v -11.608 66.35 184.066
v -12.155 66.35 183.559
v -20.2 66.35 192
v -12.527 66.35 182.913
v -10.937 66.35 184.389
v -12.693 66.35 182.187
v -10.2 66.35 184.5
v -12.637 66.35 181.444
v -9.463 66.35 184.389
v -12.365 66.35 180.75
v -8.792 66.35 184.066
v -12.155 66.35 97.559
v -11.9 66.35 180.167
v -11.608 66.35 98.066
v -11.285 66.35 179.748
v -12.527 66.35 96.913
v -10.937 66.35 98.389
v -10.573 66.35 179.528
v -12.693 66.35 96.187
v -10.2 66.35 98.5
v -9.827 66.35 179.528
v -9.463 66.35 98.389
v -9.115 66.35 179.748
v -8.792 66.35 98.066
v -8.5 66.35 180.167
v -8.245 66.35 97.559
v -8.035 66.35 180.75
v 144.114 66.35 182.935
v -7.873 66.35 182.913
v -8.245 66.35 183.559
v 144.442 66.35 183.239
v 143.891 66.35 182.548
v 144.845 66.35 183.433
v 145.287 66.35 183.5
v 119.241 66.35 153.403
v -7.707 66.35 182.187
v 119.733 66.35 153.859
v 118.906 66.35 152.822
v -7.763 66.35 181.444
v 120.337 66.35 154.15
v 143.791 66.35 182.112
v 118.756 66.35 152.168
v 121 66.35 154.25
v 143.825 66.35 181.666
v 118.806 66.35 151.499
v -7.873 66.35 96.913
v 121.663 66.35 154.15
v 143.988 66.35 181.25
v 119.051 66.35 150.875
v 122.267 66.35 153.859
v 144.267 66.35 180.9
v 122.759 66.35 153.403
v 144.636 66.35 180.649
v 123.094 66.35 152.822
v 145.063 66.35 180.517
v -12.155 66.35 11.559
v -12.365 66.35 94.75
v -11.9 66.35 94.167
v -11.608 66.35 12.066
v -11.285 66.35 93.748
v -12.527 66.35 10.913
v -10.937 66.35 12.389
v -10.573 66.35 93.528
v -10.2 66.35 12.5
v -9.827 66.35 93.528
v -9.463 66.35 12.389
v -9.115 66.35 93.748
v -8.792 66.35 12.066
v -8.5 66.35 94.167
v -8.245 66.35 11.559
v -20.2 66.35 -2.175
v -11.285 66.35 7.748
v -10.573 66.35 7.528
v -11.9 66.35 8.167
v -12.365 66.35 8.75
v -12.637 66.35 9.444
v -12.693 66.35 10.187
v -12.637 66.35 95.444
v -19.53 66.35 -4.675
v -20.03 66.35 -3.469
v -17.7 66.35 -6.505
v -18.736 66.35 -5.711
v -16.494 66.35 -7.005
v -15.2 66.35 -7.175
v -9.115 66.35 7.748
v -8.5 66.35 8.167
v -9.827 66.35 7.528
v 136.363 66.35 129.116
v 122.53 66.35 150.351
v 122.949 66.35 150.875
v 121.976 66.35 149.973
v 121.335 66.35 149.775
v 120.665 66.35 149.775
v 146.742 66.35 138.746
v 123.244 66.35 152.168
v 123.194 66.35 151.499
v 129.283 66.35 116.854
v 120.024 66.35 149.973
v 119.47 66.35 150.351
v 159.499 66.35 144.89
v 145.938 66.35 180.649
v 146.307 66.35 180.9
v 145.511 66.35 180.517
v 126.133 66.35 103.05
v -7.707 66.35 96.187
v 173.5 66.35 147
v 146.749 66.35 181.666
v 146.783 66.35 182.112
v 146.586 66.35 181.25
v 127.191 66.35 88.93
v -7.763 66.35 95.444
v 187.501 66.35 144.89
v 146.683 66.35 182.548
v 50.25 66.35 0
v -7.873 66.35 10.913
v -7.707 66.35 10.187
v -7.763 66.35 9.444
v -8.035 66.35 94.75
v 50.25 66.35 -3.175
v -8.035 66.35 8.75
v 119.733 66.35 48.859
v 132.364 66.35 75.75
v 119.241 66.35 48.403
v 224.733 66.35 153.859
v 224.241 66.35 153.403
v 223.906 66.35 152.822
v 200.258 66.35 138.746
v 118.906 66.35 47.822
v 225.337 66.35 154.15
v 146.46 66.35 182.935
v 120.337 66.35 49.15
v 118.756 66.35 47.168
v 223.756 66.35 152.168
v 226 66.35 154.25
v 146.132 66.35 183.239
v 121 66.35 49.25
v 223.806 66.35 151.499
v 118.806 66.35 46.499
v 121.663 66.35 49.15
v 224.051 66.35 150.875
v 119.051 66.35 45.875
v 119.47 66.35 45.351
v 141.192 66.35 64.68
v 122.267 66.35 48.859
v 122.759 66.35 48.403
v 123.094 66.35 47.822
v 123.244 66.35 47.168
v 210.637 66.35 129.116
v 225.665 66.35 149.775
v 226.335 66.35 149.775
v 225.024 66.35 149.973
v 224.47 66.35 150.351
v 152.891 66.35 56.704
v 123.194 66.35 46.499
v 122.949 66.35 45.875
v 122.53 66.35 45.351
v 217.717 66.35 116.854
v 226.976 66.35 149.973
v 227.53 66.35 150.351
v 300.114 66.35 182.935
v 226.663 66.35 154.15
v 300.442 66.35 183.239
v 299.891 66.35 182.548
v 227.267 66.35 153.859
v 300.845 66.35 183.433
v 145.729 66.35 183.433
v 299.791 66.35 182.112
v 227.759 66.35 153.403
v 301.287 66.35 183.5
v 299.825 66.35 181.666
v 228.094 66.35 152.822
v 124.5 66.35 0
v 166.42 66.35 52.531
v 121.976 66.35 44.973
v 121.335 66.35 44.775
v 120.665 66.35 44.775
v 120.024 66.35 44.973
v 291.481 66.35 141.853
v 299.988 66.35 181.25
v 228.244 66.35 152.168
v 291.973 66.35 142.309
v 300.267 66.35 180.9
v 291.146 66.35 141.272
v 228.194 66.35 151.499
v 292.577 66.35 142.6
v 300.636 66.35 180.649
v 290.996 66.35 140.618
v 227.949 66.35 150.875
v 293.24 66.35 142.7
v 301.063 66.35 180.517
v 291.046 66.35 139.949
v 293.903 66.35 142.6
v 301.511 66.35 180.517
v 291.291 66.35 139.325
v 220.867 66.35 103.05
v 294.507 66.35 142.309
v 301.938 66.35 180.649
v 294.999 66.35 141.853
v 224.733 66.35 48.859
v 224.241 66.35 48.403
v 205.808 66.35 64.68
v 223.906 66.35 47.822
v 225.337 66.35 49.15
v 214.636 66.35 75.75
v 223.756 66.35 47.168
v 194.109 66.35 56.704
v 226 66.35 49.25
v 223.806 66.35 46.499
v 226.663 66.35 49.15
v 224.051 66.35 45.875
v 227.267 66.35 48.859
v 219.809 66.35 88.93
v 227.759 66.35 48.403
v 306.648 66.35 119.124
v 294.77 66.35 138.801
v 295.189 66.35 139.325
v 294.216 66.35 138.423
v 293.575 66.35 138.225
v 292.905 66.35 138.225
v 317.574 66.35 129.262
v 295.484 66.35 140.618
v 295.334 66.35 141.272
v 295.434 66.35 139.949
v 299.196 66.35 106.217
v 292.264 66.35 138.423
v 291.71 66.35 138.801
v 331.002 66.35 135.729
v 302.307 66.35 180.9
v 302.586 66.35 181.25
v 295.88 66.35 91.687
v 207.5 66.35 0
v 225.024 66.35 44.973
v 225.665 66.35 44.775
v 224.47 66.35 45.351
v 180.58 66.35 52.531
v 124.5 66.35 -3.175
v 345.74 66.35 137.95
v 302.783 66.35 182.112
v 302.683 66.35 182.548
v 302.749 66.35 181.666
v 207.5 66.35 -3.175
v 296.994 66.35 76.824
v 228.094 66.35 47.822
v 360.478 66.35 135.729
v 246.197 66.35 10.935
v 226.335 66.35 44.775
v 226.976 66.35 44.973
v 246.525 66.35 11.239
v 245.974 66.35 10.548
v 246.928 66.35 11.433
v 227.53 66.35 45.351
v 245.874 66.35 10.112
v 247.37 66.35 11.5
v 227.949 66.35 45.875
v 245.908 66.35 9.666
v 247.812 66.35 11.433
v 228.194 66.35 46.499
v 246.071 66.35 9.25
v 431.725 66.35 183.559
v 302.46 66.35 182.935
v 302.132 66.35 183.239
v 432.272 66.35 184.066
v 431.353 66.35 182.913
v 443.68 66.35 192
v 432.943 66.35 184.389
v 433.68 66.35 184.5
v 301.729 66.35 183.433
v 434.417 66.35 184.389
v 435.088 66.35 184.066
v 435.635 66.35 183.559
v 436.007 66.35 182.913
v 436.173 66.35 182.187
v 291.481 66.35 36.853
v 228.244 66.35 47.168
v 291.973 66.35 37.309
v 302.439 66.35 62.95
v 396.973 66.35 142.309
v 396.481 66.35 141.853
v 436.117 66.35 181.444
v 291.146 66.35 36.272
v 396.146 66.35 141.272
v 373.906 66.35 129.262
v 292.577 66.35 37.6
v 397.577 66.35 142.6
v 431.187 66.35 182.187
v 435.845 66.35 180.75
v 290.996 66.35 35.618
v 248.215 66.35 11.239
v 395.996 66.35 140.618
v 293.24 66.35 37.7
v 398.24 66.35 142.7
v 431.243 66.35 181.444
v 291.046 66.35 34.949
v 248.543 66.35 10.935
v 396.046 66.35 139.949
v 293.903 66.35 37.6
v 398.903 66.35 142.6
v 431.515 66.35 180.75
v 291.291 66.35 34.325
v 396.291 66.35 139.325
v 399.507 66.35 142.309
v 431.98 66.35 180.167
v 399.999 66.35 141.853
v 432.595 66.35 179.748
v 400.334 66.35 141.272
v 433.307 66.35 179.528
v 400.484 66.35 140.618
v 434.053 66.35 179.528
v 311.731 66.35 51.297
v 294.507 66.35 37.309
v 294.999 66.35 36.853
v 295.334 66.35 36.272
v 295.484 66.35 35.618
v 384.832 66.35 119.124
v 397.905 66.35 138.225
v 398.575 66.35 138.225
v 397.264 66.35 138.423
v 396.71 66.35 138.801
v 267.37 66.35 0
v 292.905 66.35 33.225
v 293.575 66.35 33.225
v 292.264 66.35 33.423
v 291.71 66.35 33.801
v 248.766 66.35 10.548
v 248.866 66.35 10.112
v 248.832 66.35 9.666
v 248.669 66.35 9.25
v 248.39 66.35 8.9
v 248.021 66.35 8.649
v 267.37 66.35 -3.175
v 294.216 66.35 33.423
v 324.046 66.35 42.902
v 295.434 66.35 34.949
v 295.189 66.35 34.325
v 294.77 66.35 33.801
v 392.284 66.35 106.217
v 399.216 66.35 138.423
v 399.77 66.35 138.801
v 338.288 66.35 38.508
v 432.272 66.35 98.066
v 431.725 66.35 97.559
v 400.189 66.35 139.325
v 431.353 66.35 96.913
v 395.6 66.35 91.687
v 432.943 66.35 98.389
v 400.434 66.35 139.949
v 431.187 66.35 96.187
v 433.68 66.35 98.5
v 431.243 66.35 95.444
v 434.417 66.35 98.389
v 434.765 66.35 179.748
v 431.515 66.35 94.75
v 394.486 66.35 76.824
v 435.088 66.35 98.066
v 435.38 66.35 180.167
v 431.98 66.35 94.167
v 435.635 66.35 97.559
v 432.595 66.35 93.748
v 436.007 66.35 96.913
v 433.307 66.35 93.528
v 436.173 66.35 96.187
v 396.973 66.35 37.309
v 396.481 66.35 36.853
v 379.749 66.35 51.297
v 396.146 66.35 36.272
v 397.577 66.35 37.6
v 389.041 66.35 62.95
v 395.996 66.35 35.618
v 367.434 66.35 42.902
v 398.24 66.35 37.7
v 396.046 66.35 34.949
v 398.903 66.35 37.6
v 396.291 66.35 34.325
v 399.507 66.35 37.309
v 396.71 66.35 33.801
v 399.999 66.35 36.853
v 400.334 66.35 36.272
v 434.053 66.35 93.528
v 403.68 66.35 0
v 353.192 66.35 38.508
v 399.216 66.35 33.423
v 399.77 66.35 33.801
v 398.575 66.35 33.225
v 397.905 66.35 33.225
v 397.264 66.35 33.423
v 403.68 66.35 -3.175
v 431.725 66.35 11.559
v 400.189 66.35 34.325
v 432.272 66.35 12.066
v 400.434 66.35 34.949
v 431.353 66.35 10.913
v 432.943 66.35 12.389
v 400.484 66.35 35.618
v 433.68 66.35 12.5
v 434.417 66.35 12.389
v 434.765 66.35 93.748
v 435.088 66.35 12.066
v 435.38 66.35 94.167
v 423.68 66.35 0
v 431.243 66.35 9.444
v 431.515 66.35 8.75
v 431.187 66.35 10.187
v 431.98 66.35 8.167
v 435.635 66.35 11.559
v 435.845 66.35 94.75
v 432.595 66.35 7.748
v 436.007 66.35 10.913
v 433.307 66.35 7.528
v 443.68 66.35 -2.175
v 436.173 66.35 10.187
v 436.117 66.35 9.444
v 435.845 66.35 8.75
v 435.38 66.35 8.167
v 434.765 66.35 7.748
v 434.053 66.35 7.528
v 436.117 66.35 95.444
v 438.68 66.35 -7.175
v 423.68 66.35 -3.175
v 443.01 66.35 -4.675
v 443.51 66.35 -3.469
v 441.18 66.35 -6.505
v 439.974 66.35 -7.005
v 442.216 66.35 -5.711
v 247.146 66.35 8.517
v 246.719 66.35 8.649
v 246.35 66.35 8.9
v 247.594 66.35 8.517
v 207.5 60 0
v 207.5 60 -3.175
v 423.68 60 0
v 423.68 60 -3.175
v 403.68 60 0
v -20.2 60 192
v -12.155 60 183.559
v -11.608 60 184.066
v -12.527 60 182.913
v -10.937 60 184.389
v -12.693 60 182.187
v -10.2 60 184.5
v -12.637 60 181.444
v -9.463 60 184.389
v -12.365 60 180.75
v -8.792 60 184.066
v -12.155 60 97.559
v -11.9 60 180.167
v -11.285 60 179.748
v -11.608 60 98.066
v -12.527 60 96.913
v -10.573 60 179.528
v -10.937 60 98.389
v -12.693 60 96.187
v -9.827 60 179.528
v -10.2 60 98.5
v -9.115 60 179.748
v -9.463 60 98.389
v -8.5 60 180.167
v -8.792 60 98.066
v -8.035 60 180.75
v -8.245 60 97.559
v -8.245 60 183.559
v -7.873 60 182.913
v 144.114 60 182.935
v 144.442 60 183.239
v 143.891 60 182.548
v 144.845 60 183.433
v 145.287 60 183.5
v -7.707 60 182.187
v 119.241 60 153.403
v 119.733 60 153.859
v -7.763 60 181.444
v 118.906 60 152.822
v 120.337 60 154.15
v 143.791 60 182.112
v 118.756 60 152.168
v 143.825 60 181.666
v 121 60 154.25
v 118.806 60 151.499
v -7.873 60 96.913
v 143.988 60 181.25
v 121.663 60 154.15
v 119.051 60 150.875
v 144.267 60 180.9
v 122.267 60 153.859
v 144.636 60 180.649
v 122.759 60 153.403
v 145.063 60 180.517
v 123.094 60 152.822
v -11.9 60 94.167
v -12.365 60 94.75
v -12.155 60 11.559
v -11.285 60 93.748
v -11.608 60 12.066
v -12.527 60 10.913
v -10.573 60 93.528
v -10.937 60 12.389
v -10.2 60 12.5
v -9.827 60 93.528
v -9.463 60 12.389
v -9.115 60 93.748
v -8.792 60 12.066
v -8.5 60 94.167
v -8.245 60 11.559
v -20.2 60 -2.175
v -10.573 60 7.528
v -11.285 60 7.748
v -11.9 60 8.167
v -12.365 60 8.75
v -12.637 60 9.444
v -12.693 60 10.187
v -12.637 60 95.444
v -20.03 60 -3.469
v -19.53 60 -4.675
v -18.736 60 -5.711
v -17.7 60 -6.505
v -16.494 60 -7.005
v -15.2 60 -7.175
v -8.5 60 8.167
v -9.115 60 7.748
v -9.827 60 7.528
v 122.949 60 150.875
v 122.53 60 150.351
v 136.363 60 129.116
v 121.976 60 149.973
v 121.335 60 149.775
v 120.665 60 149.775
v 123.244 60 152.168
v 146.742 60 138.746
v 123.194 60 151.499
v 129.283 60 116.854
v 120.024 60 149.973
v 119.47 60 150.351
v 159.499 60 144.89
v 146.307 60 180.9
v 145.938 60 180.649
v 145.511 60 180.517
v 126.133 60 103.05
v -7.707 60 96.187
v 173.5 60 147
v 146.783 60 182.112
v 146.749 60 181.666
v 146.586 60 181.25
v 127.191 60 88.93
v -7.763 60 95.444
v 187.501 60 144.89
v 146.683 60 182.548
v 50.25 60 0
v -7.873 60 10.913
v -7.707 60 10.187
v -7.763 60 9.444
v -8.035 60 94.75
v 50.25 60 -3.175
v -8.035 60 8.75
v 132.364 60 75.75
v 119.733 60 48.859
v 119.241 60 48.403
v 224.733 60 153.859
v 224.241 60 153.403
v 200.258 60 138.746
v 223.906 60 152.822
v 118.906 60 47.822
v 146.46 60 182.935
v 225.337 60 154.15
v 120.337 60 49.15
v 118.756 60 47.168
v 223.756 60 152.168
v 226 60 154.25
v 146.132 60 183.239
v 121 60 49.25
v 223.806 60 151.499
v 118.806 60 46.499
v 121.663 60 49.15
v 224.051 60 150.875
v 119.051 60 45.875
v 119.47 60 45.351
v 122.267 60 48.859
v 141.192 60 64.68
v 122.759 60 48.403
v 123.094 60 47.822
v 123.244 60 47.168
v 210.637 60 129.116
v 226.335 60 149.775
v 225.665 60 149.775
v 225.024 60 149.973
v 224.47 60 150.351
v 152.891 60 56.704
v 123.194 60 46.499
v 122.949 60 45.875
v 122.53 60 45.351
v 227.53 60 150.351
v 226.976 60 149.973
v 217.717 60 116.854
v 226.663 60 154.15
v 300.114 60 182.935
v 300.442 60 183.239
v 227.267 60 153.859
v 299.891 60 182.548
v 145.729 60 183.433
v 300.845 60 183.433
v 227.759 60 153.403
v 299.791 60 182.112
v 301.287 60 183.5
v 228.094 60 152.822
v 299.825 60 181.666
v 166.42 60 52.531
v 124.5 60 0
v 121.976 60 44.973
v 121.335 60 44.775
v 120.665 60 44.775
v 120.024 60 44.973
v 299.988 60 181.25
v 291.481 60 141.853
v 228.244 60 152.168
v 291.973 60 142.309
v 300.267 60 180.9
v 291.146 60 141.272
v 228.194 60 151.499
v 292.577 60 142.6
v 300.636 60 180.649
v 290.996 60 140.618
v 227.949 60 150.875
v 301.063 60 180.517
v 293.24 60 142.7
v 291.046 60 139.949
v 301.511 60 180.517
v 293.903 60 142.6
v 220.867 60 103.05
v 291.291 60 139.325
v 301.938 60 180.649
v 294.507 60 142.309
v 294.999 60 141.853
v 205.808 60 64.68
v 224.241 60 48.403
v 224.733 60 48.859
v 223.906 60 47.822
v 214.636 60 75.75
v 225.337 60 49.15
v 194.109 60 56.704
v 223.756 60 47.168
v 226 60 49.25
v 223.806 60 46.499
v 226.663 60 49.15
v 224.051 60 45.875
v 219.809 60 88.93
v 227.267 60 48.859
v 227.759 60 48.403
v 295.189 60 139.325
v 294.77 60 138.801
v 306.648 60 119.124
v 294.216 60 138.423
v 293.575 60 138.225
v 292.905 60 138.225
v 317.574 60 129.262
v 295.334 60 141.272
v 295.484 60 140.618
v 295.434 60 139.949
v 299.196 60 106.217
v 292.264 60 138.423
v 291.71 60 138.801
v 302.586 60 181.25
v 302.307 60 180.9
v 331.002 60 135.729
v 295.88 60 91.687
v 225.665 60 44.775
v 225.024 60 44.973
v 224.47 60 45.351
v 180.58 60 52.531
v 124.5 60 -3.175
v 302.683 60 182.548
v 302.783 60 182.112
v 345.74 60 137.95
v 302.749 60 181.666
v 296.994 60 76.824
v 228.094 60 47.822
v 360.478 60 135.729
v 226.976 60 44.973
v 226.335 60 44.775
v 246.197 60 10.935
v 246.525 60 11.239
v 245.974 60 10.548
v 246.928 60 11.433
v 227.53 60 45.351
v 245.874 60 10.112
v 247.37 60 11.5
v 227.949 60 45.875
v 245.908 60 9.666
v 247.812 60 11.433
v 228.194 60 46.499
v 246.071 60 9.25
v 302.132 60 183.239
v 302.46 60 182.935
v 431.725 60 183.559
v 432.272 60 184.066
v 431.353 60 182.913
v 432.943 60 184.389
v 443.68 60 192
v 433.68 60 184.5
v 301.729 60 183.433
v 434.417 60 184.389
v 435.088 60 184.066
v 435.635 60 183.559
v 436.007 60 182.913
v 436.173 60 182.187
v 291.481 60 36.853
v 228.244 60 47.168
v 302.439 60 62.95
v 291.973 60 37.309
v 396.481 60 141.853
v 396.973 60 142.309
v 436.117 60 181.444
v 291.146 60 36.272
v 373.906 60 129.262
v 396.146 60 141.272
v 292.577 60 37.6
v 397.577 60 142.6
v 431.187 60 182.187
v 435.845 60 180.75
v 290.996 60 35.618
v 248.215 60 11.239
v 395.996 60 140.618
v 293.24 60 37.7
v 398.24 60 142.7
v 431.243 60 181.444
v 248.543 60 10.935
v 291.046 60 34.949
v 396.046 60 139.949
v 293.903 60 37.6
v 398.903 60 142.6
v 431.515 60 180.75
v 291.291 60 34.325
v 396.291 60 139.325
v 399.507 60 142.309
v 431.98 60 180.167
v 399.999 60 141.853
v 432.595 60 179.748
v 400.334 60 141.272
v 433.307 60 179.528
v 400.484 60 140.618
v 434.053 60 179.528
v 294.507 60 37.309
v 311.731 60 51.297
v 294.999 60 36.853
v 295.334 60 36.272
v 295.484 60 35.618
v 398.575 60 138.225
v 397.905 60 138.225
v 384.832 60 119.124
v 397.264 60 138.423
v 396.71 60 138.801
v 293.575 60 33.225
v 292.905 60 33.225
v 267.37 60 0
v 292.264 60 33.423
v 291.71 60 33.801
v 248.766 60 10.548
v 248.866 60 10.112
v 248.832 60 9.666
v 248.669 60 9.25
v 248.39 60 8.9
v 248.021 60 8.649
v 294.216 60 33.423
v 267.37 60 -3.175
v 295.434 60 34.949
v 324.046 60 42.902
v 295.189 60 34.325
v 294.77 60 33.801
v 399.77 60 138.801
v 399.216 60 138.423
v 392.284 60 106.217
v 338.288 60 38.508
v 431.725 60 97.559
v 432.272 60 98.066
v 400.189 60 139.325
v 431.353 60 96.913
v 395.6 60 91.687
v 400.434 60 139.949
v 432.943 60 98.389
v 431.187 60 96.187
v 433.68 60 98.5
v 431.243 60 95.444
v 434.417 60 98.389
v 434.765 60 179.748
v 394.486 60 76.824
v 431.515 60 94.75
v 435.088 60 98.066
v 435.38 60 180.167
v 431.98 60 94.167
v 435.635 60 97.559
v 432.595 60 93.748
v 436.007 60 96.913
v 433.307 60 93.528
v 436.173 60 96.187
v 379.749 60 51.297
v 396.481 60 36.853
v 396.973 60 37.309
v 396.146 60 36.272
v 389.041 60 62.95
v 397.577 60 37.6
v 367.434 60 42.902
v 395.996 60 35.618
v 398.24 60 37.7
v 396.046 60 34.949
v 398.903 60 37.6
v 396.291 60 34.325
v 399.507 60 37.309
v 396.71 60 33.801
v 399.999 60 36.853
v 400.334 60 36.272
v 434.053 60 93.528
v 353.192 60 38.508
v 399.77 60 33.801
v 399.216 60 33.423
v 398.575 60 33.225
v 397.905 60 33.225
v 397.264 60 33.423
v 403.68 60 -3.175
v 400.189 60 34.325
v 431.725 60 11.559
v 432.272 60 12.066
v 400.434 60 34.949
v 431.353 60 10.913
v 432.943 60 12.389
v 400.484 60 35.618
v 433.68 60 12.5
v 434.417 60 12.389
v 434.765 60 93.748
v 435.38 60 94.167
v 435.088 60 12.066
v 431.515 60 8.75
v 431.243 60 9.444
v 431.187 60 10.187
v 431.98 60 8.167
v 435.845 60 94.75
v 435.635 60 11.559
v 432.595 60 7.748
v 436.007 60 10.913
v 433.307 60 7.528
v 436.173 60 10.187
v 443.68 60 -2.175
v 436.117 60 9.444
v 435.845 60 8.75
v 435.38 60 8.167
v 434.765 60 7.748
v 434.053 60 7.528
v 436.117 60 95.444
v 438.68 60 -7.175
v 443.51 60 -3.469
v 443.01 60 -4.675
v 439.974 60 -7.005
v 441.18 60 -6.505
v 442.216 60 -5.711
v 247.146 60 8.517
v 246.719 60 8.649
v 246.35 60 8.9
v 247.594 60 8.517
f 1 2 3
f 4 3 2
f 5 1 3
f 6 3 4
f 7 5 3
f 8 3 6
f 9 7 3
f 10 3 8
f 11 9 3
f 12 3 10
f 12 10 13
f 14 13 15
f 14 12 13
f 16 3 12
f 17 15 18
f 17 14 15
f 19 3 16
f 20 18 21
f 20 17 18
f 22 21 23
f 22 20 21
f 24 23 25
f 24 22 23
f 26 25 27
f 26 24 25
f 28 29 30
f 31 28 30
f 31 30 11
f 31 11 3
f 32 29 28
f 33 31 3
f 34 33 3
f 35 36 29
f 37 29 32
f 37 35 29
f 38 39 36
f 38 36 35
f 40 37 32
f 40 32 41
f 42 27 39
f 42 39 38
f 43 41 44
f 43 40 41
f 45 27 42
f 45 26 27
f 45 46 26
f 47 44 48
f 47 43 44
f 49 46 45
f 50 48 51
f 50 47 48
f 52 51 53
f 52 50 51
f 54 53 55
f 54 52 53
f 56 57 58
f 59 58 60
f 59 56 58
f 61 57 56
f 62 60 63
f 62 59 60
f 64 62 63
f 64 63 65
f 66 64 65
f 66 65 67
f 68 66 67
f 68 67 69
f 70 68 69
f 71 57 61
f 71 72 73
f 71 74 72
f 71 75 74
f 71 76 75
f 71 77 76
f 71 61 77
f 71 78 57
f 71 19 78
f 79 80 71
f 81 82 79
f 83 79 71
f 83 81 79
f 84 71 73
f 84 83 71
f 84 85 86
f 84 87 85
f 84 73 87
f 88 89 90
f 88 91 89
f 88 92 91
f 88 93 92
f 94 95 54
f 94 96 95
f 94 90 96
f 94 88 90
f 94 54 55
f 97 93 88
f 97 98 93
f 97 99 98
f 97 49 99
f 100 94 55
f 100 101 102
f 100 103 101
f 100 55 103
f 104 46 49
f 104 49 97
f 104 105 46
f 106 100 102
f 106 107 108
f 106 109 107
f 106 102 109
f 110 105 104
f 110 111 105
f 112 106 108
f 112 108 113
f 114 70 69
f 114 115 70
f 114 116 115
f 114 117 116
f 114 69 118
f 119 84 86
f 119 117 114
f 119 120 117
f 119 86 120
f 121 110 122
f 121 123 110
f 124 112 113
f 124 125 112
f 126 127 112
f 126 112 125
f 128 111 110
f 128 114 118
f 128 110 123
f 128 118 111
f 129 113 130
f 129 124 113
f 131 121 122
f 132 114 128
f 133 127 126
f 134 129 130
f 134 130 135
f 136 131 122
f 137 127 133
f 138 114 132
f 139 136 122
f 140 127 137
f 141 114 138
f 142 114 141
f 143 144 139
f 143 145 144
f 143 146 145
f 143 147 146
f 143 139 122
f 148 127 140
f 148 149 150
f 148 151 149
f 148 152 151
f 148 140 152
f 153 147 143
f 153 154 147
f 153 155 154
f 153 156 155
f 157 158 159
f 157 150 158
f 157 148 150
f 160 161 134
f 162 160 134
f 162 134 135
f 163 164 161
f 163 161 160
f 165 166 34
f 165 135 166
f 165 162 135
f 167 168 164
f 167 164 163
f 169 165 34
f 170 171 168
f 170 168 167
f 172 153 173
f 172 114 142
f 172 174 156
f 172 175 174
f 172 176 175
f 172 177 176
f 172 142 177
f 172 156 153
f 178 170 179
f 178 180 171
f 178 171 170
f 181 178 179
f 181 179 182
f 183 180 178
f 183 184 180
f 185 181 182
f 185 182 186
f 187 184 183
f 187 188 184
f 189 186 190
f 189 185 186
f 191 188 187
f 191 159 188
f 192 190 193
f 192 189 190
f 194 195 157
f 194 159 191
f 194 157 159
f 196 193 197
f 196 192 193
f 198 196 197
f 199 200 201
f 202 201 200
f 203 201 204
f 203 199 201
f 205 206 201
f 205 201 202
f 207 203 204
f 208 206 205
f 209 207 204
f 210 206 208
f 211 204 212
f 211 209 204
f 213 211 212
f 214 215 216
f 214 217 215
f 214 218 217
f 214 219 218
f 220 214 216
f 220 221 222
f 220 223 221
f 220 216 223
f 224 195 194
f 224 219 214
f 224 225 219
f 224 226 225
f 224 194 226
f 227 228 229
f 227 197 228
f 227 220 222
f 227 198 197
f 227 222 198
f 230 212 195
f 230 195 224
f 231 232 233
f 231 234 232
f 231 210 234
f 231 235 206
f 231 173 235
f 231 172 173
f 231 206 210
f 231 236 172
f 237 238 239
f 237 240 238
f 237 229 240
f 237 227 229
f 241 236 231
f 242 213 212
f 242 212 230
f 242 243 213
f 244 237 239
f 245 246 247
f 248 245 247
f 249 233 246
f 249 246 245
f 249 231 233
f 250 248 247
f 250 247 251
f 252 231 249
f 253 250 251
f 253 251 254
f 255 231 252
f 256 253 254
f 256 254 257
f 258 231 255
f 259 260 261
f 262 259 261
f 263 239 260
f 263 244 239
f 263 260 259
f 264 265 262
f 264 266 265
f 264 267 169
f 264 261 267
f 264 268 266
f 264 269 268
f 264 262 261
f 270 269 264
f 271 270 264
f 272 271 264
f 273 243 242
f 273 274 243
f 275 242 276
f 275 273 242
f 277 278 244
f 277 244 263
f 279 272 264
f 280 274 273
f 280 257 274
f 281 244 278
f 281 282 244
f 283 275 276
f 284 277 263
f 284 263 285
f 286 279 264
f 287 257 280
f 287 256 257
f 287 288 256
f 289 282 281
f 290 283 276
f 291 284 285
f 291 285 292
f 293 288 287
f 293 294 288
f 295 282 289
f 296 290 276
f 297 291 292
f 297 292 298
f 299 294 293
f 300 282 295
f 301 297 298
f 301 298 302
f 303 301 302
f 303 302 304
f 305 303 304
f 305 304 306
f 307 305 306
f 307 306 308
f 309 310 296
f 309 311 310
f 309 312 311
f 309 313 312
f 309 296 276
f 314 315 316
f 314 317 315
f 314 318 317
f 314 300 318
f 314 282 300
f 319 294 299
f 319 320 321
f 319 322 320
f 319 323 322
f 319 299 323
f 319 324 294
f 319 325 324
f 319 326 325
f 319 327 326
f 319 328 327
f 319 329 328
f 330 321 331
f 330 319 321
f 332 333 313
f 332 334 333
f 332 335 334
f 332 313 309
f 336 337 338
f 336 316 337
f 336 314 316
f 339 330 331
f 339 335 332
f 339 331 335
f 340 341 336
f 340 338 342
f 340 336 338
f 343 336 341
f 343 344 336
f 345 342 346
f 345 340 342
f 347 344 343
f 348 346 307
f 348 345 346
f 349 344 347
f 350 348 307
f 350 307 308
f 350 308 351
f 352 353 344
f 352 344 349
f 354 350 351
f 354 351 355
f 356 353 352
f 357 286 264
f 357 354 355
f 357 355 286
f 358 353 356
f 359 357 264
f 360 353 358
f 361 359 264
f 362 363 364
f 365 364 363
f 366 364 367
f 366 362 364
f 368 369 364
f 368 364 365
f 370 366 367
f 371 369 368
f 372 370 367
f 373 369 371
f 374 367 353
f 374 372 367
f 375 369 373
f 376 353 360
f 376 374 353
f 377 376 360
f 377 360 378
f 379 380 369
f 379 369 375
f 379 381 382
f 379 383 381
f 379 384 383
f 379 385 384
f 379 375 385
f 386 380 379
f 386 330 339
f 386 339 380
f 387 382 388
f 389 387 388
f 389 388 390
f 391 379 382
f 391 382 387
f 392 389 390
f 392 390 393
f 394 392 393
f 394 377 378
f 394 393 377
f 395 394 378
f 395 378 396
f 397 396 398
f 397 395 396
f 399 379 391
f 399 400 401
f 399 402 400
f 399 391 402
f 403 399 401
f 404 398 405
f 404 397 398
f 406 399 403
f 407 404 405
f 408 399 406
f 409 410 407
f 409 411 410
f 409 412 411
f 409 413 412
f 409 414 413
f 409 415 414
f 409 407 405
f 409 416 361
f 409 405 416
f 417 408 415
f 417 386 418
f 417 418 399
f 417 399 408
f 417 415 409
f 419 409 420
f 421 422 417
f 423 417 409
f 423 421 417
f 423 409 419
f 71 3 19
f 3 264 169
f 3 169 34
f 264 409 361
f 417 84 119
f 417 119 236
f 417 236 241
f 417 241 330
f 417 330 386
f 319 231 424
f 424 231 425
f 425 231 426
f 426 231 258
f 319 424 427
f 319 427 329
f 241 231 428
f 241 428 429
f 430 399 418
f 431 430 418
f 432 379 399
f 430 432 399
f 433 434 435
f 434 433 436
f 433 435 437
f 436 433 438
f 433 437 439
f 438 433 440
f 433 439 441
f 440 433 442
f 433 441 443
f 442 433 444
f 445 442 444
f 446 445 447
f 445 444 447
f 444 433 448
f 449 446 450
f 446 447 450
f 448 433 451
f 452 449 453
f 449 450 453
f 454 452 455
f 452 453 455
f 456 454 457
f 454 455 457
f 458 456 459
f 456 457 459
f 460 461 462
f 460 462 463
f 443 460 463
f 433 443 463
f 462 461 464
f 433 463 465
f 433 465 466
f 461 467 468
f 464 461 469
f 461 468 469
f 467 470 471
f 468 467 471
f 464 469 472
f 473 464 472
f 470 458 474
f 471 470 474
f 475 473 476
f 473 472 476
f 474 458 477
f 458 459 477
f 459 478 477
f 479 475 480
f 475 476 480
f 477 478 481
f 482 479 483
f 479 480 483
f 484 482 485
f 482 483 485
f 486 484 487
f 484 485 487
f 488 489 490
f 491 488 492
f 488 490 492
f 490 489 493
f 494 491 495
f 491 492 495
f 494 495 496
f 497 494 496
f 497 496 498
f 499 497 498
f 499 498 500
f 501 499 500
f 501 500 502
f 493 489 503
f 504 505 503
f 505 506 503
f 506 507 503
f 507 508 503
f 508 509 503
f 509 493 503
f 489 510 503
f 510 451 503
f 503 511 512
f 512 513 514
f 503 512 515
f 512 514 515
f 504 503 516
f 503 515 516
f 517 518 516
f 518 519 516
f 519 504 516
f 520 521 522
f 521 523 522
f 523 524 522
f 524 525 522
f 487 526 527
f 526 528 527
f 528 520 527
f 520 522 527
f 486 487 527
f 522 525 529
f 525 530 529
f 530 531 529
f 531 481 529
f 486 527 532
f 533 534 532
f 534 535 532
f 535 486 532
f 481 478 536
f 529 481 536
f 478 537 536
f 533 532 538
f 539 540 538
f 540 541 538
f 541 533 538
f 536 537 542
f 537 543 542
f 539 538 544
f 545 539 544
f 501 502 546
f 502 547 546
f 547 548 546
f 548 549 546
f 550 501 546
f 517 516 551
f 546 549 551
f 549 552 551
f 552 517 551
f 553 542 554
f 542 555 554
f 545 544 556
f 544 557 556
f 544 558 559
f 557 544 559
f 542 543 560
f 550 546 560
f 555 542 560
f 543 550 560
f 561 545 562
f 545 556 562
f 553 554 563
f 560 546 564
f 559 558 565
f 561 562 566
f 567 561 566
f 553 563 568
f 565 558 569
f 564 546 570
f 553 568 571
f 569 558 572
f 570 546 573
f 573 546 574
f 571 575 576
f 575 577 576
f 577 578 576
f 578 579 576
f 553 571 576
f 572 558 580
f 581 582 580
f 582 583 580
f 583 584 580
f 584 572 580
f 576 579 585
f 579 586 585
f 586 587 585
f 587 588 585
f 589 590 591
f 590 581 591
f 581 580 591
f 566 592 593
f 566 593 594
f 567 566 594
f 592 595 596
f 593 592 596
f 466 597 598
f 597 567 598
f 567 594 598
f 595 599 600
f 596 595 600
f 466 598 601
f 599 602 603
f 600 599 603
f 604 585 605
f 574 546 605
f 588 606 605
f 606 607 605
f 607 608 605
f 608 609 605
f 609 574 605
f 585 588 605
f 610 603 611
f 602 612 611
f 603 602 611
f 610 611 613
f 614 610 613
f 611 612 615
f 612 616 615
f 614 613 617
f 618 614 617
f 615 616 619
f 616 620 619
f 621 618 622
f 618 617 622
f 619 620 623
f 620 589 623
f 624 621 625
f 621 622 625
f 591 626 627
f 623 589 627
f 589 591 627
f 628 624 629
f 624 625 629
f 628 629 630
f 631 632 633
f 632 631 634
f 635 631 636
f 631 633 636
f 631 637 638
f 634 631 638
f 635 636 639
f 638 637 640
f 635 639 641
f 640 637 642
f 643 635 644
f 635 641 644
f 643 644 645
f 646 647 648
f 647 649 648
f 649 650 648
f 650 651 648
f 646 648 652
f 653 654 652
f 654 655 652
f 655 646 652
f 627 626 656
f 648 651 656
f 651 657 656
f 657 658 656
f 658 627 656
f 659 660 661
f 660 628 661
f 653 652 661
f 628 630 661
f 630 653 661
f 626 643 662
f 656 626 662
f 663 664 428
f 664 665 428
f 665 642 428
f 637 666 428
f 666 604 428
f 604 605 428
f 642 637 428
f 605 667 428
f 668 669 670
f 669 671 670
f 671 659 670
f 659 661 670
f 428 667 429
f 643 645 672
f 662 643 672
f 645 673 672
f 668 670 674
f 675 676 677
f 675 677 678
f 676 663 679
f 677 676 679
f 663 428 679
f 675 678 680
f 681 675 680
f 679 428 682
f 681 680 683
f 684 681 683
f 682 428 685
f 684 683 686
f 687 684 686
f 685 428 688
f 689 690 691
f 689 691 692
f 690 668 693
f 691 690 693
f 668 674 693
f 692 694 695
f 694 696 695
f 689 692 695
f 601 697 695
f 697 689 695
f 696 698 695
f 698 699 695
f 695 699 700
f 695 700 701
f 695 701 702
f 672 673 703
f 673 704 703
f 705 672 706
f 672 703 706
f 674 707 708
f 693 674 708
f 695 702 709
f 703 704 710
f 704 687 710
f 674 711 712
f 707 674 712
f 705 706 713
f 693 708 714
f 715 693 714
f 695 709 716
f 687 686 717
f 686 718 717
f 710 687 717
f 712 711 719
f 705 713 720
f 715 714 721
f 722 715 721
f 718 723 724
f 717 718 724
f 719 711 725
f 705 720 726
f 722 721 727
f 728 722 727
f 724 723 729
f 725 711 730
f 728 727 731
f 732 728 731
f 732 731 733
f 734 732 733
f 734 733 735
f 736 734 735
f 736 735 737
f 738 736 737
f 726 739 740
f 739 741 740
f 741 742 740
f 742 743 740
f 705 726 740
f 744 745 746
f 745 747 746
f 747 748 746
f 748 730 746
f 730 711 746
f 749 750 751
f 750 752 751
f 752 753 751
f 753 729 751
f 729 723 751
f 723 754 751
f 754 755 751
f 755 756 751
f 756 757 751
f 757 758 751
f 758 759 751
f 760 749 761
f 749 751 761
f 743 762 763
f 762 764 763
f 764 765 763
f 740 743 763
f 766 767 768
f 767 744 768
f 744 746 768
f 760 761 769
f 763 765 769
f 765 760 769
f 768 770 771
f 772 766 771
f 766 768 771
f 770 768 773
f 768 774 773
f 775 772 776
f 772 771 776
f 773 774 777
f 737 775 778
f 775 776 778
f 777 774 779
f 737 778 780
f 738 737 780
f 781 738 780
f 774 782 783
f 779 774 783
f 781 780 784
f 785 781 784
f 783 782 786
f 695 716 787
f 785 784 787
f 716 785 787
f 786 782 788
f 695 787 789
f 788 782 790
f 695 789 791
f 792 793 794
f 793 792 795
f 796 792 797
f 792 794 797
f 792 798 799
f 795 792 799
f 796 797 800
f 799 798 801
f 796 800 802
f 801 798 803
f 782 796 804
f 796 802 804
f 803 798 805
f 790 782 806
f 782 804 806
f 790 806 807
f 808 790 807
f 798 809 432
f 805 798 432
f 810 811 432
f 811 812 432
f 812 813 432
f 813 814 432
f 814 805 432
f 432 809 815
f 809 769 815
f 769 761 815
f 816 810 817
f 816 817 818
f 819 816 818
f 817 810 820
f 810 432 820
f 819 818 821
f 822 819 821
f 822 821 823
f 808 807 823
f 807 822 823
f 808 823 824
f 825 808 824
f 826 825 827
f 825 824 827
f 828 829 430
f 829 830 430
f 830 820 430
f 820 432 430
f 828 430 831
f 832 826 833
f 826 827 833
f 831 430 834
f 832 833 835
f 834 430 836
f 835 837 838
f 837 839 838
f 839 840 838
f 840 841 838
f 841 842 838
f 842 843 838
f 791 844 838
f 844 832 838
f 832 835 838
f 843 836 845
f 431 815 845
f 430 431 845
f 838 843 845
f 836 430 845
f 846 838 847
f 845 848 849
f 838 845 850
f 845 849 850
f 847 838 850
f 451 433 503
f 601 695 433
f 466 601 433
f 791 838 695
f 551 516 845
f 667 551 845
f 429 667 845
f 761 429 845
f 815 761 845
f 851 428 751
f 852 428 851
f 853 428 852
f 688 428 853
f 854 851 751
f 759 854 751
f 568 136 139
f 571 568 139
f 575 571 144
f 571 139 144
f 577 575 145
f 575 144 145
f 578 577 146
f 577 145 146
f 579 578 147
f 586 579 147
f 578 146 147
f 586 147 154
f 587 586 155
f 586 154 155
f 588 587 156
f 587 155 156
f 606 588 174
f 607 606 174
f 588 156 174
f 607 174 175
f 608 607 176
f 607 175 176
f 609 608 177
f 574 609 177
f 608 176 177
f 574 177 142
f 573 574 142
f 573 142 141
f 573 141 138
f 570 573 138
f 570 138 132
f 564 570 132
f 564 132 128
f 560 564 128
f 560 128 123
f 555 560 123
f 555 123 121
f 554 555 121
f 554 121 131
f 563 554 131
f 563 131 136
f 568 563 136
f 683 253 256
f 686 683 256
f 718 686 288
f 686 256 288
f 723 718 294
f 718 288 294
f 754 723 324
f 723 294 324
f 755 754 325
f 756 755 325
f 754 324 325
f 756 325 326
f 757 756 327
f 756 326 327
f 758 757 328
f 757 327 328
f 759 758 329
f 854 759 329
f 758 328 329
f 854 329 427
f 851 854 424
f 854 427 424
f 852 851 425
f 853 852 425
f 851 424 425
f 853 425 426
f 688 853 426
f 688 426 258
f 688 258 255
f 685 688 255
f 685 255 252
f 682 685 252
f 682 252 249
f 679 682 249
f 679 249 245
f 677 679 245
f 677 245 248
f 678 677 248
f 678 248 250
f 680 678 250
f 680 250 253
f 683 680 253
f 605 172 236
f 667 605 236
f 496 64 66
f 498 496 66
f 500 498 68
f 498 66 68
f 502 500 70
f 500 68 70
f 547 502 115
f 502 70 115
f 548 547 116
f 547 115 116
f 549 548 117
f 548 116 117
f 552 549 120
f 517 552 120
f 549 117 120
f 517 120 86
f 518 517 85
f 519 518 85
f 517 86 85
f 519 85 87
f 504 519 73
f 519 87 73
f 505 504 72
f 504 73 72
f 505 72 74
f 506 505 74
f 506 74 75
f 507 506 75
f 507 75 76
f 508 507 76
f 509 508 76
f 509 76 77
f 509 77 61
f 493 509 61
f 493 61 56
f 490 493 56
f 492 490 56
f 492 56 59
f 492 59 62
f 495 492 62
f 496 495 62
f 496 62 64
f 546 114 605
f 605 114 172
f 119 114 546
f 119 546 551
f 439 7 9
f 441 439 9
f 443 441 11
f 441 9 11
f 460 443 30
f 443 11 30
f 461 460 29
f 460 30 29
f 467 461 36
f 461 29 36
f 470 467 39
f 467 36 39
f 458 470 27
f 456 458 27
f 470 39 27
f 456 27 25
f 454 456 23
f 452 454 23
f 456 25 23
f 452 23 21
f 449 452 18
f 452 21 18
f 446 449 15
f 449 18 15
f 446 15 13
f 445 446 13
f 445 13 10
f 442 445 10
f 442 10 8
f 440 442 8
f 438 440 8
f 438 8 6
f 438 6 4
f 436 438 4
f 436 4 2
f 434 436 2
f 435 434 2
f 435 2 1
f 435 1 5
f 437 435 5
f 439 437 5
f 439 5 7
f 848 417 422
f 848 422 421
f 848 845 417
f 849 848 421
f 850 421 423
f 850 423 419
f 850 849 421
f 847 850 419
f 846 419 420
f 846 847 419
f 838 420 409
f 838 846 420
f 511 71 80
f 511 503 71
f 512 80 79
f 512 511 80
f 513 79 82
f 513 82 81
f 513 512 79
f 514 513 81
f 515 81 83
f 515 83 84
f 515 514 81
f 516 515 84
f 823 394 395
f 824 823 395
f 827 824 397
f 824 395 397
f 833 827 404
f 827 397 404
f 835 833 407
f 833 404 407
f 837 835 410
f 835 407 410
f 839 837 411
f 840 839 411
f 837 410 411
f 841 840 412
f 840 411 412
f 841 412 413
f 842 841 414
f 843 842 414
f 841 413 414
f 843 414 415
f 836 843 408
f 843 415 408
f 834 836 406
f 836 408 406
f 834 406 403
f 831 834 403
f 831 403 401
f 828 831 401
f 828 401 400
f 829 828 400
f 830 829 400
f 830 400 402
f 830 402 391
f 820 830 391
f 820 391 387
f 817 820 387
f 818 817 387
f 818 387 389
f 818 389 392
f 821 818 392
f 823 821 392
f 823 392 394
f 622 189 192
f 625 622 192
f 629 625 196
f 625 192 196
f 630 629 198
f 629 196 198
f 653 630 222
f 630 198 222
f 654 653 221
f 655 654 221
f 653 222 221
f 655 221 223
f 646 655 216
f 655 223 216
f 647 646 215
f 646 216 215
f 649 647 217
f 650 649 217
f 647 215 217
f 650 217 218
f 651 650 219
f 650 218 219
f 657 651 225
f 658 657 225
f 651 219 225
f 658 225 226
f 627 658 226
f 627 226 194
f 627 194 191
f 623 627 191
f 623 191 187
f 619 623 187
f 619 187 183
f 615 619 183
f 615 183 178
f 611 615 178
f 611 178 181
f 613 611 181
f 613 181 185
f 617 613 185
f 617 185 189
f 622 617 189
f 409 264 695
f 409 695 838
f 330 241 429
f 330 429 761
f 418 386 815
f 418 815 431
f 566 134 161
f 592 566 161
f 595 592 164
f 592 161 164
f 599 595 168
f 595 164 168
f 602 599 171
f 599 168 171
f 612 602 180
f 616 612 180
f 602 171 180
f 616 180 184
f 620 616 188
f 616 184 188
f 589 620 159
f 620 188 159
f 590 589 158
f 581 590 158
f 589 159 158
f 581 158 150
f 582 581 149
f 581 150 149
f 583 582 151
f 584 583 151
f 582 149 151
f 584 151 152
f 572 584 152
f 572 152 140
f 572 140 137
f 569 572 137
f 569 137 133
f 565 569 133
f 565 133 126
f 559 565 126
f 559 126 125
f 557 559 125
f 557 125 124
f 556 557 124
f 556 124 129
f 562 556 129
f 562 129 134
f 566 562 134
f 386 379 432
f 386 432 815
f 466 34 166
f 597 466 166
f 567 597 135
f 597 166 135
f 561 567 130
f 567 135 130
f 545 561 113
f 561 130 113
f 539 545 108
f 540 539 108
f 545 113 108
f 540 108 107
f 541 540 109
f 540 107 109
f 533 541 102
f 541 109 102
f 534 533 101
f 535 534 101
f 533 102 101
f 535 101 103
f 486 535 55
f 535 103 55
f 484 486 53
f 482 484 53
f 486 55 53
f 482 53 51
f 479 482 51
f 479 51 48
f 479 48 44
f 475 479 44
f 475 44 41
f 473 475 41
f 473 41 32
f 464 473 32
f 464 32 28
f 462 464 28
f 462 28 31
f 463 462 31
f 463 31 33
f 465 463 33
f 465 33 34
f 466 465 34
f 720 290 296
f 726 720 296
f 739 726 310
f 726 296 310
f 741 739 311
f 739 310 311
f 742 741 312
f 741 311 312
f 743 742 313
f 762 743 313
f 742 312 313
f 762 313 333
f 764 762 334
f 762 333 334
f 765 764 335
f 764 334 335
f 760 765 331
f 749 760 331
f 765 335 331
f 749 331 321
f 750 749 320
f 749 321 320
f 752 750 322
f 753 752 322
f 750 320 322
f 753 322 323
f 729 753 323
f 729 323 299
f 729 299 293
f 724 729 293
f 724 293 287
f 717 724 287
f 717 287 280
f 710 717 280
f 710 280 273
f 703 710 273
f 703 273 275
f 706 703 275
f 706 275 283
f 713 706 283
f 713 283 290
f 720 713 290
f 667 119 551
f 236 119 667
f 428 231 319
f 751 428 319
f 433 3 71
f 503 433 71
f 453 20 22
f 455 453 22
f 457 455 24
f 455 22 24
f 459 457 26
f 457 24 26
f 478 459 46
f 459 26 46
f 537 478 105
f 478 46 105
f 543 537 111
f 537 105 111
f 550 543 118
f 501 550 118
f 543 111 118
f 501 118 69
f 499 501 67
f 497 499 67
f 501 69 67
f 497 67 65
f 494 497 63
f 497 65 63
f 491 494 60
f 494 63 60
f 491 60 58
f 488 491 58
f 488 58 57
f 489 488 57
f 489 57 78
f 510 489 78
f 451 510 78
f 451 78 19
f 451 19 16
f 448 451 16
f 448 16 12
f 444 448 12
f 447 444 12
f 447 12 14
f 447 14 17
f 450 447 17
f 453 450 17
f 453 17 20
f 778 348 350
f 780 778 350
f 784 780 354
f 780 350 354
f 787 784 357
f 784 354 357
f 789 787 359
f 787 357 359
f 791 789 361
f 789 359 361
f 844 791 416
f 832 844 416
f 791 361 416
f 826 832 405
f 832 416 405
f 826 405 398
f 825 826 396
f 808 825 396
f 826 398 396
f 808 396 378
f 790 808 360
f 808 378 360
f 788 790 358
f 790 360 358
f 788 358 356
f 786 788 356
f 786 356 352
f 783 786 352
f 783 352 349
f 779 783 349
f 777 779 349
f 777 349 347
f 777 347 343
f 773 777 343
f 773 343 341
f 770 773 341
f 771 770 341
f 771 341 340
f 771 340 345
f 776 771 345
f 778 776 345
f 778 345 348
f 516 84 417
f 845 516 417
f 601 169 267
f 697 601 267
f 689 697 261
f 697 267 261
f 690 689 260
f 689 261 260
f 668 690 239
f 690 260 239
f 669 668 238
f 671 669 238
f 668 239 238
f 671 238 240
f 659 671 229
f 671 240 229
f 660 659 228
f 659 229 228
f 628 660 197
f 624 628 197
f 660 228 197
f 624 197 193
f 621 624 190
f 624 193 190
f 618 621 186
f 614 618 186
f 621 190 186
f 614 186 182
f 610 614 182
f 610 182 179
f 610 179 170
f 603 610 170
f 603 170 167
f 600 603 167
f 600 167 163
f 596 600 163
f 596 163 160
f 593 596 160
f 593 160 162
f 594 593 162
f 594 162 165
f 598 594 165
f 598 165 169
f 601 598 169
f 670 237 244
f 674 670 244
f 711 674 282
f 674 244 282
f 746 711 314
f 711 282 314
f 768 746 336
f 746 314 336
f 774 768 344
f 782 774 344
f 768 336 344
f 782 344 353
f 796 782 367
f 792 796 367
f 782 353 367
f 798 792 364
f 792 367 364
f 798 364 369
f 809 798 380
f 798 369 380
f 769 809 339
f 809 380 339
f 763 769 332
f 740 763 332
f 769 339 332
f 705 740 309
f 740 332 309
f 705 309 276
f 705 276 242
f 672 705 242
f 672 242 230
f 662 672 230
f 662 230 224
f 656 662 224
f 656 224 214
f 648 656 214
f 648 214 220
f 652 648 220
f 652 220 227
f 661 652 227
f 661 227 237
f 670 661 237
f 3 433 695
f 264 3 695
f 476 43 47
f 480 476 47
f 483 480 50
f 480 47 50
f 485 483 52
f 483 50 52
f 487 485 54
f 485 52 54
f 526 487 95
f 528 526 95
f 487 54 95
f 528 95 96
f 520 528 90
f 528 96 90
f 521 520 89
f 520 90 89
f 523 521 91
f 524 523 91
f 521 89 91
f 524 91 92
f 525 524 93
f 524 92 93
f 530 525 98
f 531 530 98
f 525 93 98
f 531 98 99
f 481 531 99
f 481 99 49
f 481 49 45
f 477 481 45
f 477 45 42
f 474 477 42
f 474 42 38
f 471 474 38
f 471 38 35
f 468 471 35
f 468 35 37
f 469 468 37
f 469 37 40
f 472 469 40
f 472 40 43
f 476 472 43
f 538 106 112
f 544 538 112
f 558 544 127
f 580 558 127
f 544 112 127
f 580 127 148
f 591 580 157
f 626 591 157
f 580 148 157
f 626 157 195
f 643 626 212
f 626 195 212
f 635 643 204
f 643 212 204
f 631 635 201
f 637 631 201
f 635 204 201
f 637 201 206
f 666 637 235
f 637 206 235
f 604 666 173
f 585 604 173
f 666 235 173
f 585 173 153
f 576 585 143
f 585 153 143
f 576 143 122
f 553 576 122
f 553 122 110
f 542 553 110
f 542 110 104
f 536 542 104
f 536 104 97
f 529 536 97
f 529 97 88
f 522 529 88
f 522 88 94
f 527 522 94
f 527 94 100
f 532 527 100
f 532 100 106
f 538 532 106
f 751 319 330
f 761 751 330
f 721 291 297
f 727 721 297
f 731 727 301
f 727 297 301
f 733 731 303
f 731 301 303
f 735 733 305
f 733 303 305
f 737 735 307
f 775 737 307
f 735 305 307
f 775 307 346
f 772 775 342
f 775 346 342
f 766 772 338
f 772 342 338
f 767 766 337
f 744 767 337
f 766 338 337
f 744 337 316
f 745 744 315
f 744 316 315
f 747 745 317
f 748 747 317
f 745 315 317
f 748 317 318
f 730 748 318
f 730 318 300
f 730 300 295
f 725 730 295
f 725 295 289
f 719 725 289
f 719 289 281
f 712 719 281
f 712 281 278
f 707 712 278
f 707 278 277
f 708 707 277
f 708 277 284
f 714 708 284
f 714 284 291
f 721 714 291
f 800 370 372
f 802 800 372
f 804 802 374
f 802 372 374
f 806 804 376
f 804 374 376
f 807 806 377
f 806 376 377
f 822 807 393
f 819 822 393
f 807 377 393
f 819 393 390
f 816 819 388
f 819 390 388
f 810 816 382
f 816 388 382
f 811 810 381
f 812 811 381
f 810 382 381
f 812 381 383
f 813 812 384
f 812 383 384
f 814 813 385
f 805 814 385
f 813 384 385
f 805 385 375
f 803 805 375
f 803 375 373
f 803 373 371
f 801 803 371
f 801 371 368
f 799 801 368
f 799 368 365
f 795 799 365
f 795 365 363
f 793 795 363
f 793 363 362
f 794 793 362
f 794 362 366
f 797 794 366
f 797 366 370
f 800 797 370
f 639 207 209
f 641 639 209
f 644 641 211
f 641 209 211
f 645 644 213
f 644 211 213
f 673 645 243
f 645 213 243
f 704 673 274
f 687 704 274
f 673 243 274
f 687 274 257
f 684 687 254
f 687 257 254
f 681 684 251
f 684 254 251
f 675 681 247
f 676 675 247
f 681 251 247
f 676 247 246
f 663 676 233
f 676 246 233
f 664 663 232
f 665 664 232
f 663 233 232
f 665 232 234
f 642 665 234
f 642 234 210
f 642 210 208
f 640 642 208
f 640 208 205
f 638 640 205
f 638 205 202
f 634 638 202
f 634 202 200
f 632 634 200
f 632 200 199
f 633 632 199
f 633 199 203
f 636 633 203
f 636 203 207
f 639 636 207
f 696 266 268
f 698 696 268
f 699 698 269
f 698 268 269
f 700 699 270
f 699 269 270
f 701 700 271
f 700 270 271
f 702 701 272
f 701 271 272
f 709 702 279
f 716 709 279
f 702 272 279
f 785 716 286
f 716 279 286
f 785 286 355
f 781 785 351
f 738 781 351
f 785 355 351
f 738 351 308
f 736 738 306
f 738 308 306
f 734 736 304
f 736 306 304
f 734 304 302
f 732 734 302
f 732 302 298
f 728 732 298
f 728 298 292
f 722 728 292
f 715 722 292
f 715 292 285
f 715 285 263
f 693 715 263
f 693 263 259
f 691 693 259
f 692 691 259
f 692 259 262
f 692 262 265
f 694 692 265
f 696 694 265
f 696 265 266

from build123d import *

# Parameters (mm, degrees)
SKETCH1_W           = 463.88
SKETCH1_H           = 192
BOSS_EXTRUDE1_DEPTH = 6.35
SKETCH4_R           = 2.5
CUT_EXTRUDE2_DEPTH  = 484.483469107
SKETCH2_W           = 463.88
SKETCH2_H           = 7.175
BOSS_EXTRUDE2_DEPTH = 6.35
SKETCH3_W           = 74.25
SKETCH3_H           = 3.175
SKETCH3_W_2         = 59.87
SKETCH3_W_3         = 20
CUT_EXTRUDE1_DEPTH  = 484.483469107
SKETCH5_R           = 1.5
CUT_EXTRUDE3_DEPTH  = 484.483469107
FILLET1_R           = 5
SKETCH6_R           = 47.5
SKETCH6_R_2         = 50
SKETCH6_R_3         = 2.25
CUT_EXTRUDE4_DEPTH  = 484.483469107


with BuildPart() as part:
    # Sketch1 → Boss-Extrude1 (new body)
    with BuildSketch(Plane(origin=(0, 60, 0), x_dir=(1, 0, 0), z_dir=(0, 1, 0))):
        with Locations((211.74, -96)):
            Rectangle(SKETCH1_W, SKETCH1_H)
    extrude(amount=BOSS_EXTRUDE1_DEPTH)

    # Sketch4 → Cut-Extrude2 (cut, through all)
    with BuildSketch(Plane(origin=(0, 66.35, 0), x_dir=(1, 0, 0), z_dir=(0, 1, 0))):
        with Locations(Location((433.68, -10, 0), (0, 0, 270))):
            Circle(SKETCH4_R)
        with Locations(Location((433.68, -96, 0), (0, 0, 270))):
            Circle(SKETCH4_R)
        with Locations(Location((433.68, -182, 0), (0, 0, 270))):
            Circle(SKETCH4_R)
        with Locations(Location((-10.2, -182, 0), (0, 0, 270))):
            Circle(SKETCH4_R)
        with Locations(Location((-10.2, -96, 0), (0, 0, 270))):
            Circle(SKETCH4_R)
        with Locations(Location((-10.2, -10, 0), (0, 0, 270))):
            Circle(SKETCH4_R)
    extrude(amount=-CUT_EXTRUDE2_DEPTH, mode=Mode.SUBTRACT)

    # Sketch2 → Boss-Extrude2 (add)
    with BuildSketch(Plane(origin=(0, 66.35, 0), x_dir=(1, 0, 0), z_dir=(0, 1, 0))):
        with Locations((211.74, 3.5875)):
            Rectangle(SKETCH2_W, SKETCH2_H)
    extrude(amount=-BOSS_EXTRUDE2_DEPTH)

    # Sketch3 → Cut-Extrude1 (cut, through all)
    with BuildSketch(Plane(origin=(0, 66.35, 0), x_dir=(1, 0, 0), z_dir=(0, 1, 0))):
        with Locations((87.375, 1.5875)):
            Rectangle(SKETCH3_W, SKETCH3_H)
        with Locations((237.435, 1.5875)):
            Rectangle(SKETCH3_W_2, SKETCH3_H)
        with Locations((413.68, 1.5875)):
            Rectangle(SKETCH3_W_3, SKETCH3_H)
    extrude(amount=-CUT_EXTRUDE1_DEPTH, mode=Mode.SUBTRACT)

    # Sketch5 → Cut-Extrude3 (cut, through all)
    with BuildSketch(Plane(origin=(0, 66.35, 0), x_dir=(1, 0, 0), z_dir=(0, 1, 0))):
        with Locations(Location((247.37, -10, 0), (0, 0, 270))):
            Circle(SKETCH5_R)
        with Locations(Location((145.287005384, -182, 0), (0, 0, 270))):
            Circle(SKETCH5_R)
        with Locations(Location((301.287005384, -182, 0), (0, 0, 270))):
            Circle(SKETCH5_R)
    extrude(amount=-CUT_EXTRUDE3_DEPTH, mode=Mode.SUBTRACT)

    # Fillet1
    fillet1_edges = [part.edges().sort_by_distance(p)[0] for p in [
        (-20.2, 63.175, -7.175),
        (443.68, 63.175, -7.175),
    ]]
    fillet(fillet1_edges, radius=FILLET1_R)

    # Sketch6 → Cut-Extrude4 (cut, through all)
    with BuildSketch(Plane(origin=(0, 66.35, 0), x_dir=(1, 0, 0), z_dir=(0, 1, 0))):
        with Locations(Location((173.5, -99.5, 0), (0, 0, 270))):
            Circle(SKETCH6_R)
        with Locations(Location((345.74, -87.95, 0), (0, 0, 270))):
            Circle(SKETCH6_R_2)
        with Locations(Location((121, -47, 0), (0, 0, 270))):
            Circle(SKETCH6_R_3)
        with Locations(Location((226, -47, 0), (0, 0, 270))):
            Circle(SKETCH6_R_3)
        with Locations(Location((226, -152, 0), (0, 0, 270))):
            Circle(SKETCH6_R_3)
        with Locations(Location((121, -152, 0), (0, 0, 270))):
            Circle(SKETCH6_R_3)
        with Locations(Location((293.24, -140.45, 0), (0, 0, 270))):
            Circle(SKETCH6_R_3)
        with Locations(Location((293.24, -35.45, 0), (0, 0, 270))):
            Circle(SKETCH6_R_3)
        with Locations(Location((398.24, -35.45, 0), (0, 0, 270))):
            Circle(SKETCH6_R_3)
        with Locations(Location((398.24, -140.45, 0), (0, 0, 270))):
            Circle(SKETCH6_R_3)
    extrude(amount=-CUT_EXTRUDE4_DEPTH, mode=Mode.SUBTRACT)


solid = part.part
